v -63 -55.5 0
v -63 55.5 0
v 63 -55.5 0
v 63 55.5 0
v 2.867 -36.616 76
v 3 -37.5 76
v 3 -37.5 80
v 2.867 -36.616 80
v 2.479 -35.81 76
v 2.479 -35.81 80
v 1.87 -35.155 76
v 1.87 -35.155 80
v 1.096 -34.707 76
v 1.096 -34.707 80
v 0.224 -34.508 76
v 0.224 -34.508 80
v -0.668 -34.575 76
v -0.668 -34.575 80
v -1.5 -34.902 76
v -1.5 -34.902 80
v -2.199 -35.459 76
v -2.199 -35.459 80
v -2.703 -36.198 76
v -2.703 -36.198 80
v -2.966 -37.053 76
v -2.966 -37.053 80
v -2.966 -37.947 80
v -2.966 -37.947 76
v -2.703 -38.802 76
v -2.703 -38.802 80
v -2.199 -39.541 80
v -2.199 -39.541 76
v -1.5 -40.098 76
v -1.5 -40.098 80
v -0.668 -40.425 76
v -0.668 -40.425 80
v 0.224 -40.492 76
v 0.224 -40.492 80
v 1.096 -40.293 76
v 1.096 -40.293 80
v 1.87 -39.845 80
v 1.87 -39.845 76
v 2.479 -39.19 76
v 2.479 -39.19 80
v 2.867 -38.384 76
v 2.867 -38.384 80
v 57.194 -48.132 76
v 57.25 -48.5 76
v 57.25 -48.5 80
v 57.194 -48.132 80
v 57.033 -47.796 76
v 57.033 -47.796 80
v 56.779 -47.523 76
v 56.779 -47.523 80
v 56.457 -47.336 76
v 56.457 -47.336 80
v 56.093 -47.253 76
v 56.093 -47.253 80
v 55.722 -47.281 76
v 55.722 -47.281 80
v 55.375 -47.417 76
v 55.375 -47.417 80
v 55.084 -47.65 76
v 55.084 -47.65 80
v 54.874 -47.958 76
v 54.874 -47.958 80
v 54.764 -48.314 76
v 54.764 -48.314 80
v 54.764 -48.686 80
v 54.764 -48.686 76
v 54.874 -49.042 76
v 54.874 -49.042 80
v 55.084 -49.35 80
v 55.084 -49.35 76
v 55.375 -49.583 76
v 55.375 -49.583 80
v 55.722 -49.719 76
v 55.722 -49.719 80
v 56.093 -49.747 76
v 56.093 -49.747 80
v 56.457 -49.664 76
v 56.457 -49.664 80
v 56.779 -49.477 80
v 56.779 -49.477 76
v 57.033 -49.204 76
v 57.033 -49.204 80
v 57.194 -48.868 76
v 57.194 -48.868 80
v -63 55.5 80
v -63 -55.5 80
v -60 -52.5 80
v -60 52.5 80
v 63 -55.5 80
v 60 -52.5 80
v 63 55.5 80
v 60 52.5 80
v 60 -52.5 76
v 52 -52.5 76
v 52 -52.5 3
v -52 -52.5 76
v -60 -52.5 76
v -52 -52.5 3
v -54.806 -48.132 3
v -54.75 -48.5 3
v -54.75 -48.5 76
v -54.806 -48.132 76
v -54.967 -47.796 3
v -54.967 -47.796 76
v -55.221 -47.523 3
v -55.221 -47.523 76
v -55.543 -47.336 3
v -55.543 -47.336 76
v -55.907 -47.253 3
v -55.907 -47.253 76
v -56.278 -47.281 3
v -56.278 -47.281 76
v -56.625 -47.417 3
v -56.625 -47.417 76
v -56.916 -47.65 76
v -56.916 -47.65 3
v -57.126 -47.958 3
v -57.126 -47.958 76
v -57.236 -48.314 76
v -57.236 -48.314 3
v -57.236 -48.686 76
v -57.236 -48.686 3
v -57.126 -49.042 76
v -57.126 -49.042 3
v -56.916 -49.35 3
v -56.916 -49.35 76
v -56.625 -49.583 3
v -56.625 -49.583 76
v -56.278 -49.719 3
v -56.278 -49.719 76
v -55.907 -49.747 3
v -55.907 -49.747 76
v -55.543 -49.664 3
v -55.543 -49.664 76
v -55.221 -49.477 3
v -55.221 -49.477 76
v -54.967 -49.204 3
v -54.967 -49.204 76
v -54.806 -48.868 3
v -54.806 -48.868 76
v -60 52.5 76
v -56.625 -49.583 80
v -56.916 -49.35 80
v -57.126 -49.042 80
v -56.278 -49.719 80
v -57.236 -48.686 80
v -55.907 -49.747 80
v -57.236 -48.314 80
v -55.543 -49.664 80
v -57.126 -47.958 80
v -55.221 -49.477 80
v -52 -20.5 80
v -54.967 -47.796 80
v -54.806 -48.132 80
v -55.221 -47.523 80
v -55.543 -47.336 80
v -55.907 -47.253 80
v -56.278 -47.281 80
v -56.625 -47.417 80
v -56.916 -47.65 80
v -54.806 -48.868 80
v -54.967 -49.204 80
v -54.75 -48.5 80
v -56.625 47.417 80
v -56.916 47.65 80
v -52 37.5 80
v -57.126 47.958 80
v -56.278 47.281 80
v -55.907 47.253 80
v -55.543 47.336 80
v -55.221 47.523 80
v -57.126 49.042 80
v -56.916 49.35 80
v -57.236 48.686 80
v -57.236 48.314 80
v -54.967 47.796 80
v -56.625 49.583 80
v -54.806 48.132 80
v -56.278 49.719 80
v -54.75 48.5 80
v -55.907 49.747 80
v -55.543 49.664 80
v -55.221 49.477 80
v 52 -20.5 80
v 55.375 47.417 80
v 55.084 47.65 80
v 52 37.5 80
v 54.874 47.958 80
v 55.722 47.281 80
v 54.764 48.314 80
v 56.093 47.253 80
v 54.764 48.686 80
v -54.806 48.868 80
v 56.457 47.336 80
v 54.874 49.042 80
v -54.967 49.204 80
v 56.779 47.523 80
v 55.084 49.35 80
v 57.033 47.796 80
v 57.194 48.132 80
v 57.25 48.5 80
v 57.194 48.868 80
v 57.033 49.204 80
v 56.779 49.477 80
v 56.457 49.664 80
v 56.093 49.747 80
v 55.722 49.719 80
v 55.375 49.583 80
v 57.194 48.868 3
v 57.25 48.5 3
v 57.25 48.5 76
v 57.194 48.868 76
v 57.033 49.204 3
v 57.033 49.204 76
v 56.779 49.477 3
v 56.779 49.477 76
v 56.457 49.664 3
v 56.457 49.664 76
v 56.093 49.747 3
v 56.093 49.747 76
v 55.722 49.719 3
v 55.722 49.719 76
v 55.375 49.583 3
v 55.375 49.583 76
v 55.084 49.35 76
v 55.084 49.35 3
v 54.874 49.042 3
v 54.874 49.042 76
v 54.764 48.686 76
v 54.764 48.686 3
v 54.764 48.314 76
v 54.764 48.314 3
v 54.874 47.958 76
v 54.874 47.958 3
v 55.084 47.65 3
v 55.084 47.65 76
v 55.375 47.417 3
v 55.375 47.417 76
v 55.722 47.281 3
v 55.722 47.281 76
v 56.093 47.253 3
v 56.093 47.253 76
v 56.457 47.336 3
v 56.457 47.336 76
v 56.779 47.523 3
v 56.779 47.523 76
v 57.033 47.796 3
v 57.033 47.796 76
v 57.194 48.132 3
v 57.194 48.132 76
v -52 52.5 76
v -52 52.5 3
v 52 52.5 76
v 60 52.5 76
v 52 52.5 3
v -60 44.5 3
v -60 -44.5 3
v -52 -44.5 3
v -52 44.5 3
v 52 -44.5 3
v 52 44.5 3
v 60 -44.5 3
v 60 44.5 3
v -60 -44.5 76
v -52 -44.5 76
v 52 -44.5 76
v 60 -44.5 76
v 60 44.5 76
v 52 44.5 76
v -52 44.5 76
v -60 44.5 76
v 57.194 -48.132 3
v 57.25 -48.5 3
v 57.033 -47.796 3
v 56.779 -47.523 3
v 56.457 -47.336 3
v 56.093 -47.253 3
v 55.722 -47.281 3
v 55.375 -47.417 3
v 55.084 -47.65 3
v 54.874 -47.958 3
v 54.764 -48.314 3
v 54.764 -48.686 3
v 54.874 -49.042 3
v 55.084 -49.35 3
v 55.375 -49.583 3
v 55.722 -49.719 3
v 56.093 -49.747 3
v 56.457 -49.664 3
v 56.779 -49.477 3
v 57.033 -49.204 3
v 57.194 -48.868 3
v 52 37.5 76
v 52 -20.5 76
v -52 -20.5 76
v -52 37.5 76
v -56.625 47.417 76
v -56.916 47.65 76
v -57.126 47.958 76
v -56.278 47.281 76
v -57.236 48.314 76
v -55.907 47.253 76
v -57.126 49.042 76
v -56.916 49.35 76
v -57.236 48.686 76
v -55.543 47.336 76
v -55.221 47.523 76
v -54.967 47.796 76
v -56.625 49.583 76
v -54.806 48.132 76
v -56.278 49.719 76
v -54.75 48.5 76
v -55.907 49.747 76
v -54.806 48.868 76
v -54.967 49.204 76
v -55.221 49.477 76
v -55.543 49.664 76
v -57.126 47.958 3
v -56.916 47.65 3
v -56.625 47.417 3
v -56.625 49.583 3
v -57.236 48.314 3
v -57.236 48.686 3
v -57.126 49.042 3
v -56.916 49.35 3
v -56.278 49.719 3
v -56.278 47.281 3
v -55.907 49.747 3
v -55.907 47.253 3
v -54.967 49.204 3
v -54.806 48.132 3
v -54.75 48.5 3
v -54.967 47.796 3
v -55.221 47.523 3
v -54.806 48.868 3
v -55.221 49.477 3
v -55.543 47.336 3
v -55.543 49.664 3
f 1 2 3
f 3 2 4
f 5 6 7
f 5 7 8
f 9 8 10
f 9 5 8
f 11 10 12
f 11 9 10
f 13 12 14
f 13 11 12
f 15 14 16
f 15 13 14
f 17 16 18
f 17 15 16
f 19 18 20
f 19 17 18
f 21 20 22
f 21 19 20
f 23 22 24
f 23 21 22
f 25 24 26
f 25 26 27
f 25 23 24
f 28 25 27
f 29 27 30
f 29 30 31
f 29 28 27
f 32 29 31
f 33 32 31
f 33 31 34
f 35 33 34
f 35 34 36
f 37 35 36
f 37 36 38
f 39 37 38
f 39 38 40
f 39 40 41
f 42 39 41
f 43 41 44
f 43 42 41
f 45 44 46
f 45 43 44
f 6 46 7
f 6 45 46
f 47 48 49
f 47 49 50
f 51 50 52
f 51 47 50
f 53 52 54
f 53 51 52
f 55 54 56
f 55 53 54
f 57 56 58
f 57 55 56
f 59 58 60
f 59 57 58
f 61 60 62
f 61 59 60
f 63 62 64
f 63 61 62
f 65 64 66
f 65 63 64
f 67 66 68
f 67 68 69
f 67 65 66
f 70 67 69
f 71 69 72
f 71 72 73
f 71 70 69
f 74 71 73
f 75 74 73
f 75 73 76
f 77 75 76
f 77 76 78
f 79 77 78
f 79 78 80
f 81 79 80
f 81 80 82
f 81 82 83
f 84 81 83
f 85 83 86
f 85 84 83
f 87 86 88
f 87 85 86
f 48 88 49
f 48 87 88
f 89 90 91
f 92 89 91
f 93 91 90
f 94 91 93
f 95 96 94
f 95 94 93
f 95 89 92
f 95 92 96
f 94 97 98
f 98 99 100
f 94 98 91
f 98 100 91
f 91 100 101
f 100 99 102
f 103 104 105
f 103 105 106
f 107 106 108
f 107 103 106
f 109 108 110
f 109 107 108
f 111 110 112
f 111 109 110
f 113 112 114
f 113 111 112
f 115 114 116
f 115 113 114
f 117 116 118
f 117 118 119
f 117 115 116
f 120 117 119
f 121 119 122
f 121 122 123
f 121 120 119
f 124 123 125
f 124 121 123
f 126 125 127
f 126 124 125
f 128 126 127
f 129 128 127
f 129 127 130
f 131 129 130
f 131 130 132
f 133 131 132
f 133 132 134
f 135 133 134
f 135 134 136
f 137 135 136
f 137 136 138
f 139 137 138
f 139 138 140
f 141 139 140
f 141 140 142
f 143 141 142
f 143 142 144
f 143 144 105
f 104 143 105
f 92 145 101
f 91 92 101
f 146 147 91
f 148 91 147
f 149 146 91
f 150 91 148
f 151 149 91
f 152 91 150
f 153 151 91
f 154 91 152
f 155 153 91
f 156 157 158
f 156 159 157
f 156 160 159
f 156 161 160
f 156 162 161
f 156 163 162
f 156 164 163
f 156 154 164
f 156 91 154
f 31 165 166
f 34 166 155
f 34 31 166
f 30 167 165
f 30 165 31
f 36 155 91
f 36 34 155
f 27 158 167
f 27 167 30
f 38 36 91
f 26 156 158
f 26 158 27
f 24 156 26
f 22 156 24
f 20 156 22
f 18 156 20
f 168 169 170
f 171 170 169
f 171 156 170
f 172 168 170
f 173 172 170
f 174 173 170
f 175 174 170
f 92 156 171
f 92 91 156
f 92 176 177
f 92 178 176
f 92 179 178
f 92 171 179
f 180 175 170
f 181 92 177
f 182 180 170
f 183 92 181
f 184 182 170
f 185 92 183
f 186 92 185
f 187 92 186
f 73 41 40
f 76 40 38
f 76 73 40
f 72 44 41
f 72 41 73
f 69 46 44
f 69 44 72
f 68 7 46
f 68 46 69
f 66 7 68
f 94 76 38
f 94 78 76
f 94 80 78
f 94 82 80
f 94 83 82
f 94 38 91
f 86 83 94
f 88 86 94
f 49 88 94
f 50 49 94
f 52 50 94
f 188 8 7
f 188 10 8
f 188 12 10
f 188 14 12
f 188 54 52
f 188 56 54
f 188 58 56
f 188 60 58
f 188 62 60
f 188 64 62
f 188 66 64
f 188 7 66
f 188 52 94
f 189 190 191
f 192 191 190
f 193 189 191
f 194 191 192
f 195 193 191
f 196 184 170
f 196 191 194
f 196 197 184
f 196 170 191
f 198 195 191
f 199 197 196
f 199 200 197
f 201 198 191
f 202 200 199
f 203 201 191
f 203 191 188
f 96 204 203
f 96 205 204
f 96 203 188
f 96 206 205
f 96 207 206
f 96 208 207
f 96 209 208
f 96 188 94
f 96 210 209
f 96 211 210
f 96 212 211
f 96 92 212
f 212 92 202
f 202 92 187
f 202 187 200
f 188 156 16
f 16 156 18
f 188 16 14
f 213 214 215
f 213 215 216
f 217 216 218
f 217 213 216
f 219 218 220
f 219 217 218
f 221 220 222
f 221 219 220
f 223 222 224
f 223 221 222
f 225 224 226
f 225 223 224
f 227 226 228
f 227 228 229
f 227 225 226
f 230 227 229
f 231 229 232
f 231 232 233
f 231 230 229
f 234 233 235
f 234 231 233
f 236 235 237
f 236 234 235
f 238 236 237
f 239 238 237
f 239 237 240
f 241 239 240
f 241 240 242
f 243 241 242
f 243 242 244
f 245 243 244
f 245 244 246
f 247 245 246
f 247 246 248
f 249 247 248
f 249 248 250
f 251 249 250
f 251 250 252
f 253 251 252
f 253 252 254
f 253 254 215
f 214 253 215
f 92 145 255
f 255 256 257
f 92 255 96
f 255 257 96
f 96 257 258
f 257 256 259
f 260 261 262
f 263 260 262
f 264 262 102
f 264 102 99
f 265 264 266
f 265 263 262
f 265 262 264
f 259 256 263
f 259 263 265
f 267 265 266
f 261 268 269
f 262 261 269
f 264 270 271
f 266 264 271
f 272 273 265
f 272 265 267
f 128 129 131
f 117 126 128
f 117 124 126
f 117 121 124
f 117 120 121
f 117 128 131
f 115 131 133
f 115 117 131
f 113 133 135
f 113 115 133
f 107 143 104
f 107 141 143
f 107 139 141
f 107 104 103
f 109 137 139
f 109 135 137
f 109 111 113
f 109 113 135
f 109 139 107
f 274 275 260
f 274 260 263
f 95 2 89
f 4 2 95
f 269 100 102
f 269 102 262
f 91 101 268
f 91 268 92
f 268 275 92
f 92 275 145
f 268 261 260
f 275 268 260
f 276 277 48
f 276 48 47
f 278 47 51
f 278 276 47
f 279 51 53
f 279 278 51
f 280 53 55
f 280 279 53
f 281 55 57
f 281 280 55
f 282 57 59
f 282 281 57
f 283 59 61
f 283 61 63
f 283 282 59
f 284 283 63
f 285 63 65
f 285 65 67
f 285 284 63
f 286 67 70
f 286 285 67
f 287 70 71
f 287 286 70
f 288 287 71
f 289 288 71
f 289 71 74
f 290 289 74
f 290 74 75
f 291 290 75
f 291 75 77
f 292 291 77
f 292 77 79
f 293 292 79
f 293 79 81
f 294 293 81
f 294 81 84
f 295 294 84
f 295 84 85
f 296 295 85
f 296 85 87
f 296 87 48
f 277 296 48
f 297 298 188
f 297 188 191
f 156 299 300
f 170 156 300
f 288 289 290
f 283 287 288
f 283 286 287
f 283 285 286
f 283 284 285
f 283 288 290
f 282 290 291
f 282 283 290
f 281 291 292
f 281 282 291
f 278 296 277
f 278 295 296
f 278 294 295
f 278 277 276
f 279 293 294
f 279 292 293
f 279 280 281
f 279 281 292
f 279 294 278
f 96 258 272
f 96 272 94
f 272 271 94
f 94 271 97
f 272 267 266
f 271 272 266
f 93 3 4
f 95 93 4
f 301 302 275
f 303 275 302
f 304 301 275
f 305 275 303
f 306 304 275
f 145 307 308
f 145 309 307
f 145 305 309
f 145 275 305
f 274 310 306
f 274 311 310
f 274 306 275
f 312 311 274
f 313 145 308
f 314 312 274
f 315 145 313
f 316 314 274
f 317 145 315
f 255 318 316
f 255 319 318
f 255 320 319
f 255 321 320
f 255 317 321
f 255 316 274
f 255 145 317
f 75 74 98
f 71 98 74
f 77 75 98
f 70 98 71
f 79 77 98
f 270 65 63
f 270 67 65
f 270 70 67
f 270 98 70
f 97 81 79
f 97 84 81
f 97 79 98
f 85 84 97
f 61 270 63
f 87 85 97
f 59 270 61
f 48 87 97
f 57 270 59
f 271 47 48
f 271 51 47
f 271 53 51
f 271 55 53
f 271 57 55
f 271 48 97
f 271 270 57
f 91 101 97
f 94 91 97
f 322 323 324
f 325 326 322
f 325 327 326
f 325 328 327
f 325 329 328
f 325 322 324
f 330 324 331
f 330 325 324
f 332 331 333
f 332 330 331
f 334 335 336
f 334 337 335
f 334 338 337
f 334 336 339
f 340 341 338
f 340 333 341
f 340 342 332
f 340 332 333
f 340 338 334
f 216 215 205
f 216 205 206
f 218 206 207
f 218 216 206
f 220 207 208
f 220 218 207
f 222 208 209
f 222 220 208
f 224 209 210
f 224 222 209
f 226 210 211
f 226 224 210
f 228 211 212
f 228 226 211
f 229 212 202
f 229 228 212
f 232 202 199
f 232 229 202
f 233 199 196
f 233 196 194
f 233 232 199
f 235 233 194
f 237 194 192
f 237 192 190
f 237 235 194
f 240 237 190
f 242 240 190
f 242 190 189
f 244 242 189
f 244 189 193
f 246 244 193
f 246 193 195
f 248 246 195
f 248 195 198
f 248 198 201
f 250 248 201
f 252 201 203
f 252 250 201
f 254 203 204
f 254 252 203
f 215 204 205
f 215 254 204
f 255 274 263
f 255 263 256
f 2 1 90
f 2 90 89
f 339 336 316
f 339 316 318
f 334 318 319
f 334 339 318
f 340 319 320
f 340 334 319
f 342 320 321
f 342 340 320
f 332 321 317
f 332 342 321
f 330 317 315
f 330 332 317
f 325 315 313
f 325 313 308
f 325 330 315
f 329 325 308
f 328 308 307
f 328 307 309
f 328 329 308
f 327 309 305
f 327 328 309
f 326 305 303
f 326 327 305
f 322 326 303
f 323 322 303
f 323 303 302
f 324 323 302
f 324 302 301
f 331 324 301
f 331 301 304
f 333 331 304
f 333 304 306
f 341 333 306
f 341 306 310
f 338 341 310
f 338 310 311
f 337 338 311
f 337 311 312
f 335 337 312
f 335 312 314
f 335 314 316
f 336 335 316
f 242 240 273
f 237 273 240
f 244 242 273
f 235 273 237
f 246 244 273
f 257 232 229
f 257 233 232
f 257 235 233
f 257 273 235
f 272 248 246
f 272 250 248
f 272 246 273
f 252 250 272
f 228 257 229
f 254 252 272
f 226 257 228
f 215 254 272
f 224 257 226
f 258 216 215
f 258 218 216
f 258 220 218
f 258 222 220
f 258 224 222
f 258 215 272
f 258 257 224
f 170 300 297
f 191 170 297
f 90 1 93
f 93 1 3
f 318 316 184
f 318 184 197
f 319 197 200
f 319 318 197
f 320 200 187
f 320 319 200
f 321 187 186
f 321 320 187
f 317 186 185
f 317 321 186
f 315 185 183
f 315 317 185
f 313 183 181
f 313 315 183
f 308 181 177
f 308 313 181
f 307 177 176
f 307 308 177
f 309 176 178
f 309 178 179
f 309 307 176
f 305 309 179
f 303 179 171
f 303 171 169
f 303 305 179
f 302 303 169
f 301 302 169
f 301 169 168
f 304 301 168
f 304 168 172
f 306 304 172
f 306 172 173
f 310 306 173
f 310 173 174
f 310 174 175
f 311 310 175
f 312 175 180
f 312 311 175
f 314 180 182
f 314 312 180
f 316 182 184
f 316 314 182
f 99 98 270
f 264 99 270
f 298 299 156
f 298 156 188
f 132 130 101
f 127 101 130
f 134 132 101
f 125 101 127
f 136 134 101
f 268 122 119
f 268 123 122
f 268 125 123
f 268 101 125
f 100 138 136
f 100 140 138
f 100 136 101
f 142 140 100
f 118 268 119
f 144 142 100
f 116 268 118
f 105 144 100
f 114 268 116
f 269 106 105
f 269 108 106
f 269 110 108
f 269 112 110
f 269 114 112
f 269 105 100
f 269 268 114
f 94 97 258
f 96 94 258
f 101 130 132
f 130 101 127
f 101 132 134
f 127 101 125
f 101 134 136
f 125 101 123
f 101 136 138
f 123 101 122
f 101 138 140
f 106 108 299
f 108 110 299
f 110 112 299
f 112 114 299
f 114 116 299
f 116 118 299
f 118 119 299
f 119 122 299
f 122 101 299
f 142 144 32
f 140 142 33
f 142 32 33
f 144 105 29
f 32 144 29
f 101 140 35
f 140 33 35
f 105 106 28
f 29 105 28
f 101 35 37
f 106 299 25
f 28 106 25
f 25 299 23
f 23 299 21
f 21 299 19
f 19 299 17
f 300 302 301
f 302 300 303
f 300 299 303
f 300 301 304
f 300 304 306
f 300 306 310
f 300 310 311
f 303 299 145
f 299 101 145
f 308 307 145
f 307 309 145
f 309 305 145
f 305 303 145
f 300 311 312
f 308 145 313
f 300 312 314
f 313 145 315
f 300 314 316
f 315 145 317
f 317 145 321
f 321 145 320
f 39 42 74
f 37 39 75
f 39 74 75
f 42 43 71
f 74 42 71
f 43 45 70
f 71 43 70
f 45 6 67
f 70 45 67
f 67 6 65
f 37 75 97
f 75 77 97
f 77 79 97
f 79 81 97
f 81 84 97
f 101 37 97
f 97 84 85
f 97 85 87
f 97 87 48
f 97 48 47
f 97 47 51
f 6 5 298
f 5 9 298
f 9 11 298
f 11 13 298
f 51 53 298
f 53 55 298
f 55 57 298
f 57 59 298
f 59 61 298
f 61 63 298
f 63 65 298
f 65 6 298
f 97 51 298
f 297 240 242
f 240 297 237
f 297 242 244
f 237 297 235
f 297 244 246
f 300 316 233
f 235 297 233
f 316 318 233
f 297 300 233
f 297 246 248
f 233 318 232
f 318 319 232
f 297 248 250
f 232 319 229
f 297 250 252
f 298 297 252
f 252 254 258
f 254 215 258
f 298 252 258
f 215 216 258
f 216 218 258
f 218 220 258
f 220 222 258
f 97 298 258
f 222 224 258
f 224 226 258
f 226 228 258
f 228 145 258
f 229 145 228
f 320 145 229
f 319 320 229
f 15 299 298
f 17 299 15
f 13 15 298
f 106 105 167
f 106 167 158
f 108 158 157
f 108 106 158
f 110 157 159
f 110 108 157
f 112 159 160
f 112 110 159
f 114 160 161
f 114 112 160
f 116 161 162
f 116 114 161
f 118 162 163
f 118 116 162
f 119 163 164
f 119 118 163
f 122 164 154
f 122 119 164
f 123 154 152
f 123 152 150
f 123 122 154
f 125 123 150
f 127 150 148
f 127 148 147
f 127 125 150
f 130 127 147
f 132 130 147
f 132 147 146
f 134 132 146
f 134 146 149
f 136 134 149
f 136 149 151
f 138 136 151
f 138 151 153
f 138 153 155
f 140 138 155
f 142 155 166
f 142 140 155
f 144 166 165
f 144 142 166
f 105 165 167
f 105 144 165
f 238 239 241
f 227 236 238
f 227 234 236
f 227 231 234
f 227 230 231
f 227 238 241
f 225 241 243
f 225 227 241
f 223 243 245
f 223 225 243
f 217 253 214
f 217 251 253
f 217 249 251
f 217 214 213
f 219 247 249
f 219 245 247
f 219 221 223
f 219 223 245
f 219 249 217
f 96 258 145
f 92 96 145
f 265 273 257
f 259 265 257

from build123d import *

# Parameters (mm, degrees)
F0_W     = 126
F0_H     = 111
F0_R     = 3
F0_W_2   = 104
F0_H_2   = 58
F0_W_3   = 8
F0_H_3   = 8
F0_R_2   = 1.25
F1_DEPTH = 3
F2_DEPTH = 80
F3_DEPTH = 76
F4_DEPTH = 4


with BuildPart() as f1:
    # F0 (on Top) → F1 (new body)
    with BuildSketch(Plane.XY):
        Rectangle(F0_W, F0_H)
        Polygon((60, -44.5), (60, -52.5), (52, -52.5), (-52, -52.5), (-60, -52.5), (-60, -44.5), (-60, 44.5), (-60, 52.5), (-52, 52.5), (52, 52.5), (60, 52.5), (60, 44.5), align=None, mode=Mode.SUBTRACT)
        Polygon((-52, -52.5), (52, -52.5), (52, -44.5), (60, -44.5), (60, 44.5), (52, 44.5), (52, 52.5), (-52, 52.5), (-52, 44.5), (-60, 44.5), (-60, -44.5), (-52, -44.5), align=None)
        with Locations((0, -37.5)):
            Circle(F0_R, mode=Mode.SUBTRACT)
        with Locations((0, 8.5)):
            Rectangle(F0_W_2, F0_H_2, mode=Mode.SUBTRACT)
        with Locations((0, 8.5)):
            Rectangle(F0_W_2, F0_H_2)
        with Locations((-56, -48.5)):
            Rectangle(F0_W_3, F0_H_3)
        with Locations((-56, -48.5)):
            Circle(F0_R_2, mode=Mode.SUBTRACT)
        with Locations((56, 48.5)):
            Rectangle(F0_W_3, F0_H_3)
        with Locations((56, 48.5)):
            Circle(F0_R_2, mode=Mode.SUBTRACT)
        with Locations((-56, 48.5)):
            Rectangle(F0_W_3, F0_H_3)
        with Locations((-56, 48.5)):
            Circle(F0_R_2, mode=Mode.SUBTRACT)
        with Locations((56, -48.5)):
            Rectangle(F0_W_3, F0_H_3)
        with Locations((56, -48.5)):
            Circle(F0_R_2, mode=Mode.SUBTRACT)
        with Locations((0, -37.5)):
            Circle(F0_R)
        with Locations((-56, -48.5)):
            Circle(F0_R_2)
        with Locations((56, 48.5)):
            Circle(F0_R_2)
        with Locations((-56, 48.5)):
            Circle(F0_R_2)
        with Locations((56, -48.5)):
            Circle(F0_R_2)
    extrude(amount=F1_DEPTH)

    # F0 (on Top) → F2 (join)
    with BuildSketch(Plane.XY):
        Rectangle(F0_W, F0_H)
        Polygon((60, -44.5), (60, -52.5), (52, -52.5), (-52, -52.5), (-60, -52.5), (-60, -44.5), (-60, 44.5), (-60, 52.5), (-52, 52.5), (52, 52.5), (60, 52.5), (60, 44.5), align=None, mode=Mode.SUBTRACT)
    extrude(amount=F2_DEPTH)

    # F0 (on Top) → F3 (join)
    with BuildSketch(Plane.XY):
        with Locations((56, -48.5)):
            Rectangle(F0_W_3, F0_H_3)
        with Locations((56, -48.5)):
            Circle(F0_R_2, mode=Mode.SUBTRACT)
        with Locations((56, 48.5)):
            Rectangle(F0_W_3, F0_H_3)
        with Locations((56, 48.5)):
            Circle(F0_R_2, mode=Mode.SUBTRACT)
        with Locations((-56, -48.5)):
            Rectangle(F0_W_3, F0_H_3)
        with Locations((-56, -48.5)):
            Circle(F0_R_2, mode=Mode.SUBTRACT)
        with Locations((-56, 48.5)):
            Rectangle(F0_W_3, F0_H_3)
        with Locations((-56, 48.5)):
            Circle(F0_R_2, mode=Mode.SUBTRACT)
    extrude(amount=F3_DEPTH)


with BuildPart() as f4:
    # F0 (on Top) → F4 (new body)
    with BuildSketch(Plane.XY):
        Polygon((-52, -52.5), (52, -52.5), (52, -44.5), (60, -44.5), (60, 44.5), (52, 44.5), (52, 52.5), (-52, 52.5), (-52, 44.5), (-60, 44.5), (-60, -44.5), (-52, -44.5), align=None)
        with Locations((0, -37.5)):
            Circle(F0_R, mode=Mode.SUBTRACT)
        with Locations((0, 8.5)):
            Rectangle(F0_W_2, F0_H_2, mode=Mode.SUBTRACT)
        with Locations((-56, -48.5)):
            Rectangle(F0_W_3, F0_H_3)
        with Locations((-56, -48.5)):
            Circle(F0_R_2, mode=Mode.SUBTRACT)
        with Locations((-56, 48.5)):
            Rectangle(F0_W_3, F0_H_3)
        with Locations((-56, 48.5)):
            Circle(F0_R_2, mode=Mode.SUBTRACT)
        with Locations((56, 48.5)):
            Rectangle(F0_W_3, F0_H_3)
        with Locations((56, 48.5)):
            Circle(F0_R_2, mode=Mode.SUBTRACT)
        with Locations((56, -48.5)):
            Rectangle(F0_W_3, F0_H_3)
        with Locations((56, -48.5)):
            Circle(F0_R_2, mode=Mode.SUBTRACT)
    extrude(amount=F4_DEPTH)


with BuildPart() as f4_1:
    # F5: moved
    add(f4.part.moved(Location((0, 0, 76))))


solid = Compound([f1.part, f4_1.part])
